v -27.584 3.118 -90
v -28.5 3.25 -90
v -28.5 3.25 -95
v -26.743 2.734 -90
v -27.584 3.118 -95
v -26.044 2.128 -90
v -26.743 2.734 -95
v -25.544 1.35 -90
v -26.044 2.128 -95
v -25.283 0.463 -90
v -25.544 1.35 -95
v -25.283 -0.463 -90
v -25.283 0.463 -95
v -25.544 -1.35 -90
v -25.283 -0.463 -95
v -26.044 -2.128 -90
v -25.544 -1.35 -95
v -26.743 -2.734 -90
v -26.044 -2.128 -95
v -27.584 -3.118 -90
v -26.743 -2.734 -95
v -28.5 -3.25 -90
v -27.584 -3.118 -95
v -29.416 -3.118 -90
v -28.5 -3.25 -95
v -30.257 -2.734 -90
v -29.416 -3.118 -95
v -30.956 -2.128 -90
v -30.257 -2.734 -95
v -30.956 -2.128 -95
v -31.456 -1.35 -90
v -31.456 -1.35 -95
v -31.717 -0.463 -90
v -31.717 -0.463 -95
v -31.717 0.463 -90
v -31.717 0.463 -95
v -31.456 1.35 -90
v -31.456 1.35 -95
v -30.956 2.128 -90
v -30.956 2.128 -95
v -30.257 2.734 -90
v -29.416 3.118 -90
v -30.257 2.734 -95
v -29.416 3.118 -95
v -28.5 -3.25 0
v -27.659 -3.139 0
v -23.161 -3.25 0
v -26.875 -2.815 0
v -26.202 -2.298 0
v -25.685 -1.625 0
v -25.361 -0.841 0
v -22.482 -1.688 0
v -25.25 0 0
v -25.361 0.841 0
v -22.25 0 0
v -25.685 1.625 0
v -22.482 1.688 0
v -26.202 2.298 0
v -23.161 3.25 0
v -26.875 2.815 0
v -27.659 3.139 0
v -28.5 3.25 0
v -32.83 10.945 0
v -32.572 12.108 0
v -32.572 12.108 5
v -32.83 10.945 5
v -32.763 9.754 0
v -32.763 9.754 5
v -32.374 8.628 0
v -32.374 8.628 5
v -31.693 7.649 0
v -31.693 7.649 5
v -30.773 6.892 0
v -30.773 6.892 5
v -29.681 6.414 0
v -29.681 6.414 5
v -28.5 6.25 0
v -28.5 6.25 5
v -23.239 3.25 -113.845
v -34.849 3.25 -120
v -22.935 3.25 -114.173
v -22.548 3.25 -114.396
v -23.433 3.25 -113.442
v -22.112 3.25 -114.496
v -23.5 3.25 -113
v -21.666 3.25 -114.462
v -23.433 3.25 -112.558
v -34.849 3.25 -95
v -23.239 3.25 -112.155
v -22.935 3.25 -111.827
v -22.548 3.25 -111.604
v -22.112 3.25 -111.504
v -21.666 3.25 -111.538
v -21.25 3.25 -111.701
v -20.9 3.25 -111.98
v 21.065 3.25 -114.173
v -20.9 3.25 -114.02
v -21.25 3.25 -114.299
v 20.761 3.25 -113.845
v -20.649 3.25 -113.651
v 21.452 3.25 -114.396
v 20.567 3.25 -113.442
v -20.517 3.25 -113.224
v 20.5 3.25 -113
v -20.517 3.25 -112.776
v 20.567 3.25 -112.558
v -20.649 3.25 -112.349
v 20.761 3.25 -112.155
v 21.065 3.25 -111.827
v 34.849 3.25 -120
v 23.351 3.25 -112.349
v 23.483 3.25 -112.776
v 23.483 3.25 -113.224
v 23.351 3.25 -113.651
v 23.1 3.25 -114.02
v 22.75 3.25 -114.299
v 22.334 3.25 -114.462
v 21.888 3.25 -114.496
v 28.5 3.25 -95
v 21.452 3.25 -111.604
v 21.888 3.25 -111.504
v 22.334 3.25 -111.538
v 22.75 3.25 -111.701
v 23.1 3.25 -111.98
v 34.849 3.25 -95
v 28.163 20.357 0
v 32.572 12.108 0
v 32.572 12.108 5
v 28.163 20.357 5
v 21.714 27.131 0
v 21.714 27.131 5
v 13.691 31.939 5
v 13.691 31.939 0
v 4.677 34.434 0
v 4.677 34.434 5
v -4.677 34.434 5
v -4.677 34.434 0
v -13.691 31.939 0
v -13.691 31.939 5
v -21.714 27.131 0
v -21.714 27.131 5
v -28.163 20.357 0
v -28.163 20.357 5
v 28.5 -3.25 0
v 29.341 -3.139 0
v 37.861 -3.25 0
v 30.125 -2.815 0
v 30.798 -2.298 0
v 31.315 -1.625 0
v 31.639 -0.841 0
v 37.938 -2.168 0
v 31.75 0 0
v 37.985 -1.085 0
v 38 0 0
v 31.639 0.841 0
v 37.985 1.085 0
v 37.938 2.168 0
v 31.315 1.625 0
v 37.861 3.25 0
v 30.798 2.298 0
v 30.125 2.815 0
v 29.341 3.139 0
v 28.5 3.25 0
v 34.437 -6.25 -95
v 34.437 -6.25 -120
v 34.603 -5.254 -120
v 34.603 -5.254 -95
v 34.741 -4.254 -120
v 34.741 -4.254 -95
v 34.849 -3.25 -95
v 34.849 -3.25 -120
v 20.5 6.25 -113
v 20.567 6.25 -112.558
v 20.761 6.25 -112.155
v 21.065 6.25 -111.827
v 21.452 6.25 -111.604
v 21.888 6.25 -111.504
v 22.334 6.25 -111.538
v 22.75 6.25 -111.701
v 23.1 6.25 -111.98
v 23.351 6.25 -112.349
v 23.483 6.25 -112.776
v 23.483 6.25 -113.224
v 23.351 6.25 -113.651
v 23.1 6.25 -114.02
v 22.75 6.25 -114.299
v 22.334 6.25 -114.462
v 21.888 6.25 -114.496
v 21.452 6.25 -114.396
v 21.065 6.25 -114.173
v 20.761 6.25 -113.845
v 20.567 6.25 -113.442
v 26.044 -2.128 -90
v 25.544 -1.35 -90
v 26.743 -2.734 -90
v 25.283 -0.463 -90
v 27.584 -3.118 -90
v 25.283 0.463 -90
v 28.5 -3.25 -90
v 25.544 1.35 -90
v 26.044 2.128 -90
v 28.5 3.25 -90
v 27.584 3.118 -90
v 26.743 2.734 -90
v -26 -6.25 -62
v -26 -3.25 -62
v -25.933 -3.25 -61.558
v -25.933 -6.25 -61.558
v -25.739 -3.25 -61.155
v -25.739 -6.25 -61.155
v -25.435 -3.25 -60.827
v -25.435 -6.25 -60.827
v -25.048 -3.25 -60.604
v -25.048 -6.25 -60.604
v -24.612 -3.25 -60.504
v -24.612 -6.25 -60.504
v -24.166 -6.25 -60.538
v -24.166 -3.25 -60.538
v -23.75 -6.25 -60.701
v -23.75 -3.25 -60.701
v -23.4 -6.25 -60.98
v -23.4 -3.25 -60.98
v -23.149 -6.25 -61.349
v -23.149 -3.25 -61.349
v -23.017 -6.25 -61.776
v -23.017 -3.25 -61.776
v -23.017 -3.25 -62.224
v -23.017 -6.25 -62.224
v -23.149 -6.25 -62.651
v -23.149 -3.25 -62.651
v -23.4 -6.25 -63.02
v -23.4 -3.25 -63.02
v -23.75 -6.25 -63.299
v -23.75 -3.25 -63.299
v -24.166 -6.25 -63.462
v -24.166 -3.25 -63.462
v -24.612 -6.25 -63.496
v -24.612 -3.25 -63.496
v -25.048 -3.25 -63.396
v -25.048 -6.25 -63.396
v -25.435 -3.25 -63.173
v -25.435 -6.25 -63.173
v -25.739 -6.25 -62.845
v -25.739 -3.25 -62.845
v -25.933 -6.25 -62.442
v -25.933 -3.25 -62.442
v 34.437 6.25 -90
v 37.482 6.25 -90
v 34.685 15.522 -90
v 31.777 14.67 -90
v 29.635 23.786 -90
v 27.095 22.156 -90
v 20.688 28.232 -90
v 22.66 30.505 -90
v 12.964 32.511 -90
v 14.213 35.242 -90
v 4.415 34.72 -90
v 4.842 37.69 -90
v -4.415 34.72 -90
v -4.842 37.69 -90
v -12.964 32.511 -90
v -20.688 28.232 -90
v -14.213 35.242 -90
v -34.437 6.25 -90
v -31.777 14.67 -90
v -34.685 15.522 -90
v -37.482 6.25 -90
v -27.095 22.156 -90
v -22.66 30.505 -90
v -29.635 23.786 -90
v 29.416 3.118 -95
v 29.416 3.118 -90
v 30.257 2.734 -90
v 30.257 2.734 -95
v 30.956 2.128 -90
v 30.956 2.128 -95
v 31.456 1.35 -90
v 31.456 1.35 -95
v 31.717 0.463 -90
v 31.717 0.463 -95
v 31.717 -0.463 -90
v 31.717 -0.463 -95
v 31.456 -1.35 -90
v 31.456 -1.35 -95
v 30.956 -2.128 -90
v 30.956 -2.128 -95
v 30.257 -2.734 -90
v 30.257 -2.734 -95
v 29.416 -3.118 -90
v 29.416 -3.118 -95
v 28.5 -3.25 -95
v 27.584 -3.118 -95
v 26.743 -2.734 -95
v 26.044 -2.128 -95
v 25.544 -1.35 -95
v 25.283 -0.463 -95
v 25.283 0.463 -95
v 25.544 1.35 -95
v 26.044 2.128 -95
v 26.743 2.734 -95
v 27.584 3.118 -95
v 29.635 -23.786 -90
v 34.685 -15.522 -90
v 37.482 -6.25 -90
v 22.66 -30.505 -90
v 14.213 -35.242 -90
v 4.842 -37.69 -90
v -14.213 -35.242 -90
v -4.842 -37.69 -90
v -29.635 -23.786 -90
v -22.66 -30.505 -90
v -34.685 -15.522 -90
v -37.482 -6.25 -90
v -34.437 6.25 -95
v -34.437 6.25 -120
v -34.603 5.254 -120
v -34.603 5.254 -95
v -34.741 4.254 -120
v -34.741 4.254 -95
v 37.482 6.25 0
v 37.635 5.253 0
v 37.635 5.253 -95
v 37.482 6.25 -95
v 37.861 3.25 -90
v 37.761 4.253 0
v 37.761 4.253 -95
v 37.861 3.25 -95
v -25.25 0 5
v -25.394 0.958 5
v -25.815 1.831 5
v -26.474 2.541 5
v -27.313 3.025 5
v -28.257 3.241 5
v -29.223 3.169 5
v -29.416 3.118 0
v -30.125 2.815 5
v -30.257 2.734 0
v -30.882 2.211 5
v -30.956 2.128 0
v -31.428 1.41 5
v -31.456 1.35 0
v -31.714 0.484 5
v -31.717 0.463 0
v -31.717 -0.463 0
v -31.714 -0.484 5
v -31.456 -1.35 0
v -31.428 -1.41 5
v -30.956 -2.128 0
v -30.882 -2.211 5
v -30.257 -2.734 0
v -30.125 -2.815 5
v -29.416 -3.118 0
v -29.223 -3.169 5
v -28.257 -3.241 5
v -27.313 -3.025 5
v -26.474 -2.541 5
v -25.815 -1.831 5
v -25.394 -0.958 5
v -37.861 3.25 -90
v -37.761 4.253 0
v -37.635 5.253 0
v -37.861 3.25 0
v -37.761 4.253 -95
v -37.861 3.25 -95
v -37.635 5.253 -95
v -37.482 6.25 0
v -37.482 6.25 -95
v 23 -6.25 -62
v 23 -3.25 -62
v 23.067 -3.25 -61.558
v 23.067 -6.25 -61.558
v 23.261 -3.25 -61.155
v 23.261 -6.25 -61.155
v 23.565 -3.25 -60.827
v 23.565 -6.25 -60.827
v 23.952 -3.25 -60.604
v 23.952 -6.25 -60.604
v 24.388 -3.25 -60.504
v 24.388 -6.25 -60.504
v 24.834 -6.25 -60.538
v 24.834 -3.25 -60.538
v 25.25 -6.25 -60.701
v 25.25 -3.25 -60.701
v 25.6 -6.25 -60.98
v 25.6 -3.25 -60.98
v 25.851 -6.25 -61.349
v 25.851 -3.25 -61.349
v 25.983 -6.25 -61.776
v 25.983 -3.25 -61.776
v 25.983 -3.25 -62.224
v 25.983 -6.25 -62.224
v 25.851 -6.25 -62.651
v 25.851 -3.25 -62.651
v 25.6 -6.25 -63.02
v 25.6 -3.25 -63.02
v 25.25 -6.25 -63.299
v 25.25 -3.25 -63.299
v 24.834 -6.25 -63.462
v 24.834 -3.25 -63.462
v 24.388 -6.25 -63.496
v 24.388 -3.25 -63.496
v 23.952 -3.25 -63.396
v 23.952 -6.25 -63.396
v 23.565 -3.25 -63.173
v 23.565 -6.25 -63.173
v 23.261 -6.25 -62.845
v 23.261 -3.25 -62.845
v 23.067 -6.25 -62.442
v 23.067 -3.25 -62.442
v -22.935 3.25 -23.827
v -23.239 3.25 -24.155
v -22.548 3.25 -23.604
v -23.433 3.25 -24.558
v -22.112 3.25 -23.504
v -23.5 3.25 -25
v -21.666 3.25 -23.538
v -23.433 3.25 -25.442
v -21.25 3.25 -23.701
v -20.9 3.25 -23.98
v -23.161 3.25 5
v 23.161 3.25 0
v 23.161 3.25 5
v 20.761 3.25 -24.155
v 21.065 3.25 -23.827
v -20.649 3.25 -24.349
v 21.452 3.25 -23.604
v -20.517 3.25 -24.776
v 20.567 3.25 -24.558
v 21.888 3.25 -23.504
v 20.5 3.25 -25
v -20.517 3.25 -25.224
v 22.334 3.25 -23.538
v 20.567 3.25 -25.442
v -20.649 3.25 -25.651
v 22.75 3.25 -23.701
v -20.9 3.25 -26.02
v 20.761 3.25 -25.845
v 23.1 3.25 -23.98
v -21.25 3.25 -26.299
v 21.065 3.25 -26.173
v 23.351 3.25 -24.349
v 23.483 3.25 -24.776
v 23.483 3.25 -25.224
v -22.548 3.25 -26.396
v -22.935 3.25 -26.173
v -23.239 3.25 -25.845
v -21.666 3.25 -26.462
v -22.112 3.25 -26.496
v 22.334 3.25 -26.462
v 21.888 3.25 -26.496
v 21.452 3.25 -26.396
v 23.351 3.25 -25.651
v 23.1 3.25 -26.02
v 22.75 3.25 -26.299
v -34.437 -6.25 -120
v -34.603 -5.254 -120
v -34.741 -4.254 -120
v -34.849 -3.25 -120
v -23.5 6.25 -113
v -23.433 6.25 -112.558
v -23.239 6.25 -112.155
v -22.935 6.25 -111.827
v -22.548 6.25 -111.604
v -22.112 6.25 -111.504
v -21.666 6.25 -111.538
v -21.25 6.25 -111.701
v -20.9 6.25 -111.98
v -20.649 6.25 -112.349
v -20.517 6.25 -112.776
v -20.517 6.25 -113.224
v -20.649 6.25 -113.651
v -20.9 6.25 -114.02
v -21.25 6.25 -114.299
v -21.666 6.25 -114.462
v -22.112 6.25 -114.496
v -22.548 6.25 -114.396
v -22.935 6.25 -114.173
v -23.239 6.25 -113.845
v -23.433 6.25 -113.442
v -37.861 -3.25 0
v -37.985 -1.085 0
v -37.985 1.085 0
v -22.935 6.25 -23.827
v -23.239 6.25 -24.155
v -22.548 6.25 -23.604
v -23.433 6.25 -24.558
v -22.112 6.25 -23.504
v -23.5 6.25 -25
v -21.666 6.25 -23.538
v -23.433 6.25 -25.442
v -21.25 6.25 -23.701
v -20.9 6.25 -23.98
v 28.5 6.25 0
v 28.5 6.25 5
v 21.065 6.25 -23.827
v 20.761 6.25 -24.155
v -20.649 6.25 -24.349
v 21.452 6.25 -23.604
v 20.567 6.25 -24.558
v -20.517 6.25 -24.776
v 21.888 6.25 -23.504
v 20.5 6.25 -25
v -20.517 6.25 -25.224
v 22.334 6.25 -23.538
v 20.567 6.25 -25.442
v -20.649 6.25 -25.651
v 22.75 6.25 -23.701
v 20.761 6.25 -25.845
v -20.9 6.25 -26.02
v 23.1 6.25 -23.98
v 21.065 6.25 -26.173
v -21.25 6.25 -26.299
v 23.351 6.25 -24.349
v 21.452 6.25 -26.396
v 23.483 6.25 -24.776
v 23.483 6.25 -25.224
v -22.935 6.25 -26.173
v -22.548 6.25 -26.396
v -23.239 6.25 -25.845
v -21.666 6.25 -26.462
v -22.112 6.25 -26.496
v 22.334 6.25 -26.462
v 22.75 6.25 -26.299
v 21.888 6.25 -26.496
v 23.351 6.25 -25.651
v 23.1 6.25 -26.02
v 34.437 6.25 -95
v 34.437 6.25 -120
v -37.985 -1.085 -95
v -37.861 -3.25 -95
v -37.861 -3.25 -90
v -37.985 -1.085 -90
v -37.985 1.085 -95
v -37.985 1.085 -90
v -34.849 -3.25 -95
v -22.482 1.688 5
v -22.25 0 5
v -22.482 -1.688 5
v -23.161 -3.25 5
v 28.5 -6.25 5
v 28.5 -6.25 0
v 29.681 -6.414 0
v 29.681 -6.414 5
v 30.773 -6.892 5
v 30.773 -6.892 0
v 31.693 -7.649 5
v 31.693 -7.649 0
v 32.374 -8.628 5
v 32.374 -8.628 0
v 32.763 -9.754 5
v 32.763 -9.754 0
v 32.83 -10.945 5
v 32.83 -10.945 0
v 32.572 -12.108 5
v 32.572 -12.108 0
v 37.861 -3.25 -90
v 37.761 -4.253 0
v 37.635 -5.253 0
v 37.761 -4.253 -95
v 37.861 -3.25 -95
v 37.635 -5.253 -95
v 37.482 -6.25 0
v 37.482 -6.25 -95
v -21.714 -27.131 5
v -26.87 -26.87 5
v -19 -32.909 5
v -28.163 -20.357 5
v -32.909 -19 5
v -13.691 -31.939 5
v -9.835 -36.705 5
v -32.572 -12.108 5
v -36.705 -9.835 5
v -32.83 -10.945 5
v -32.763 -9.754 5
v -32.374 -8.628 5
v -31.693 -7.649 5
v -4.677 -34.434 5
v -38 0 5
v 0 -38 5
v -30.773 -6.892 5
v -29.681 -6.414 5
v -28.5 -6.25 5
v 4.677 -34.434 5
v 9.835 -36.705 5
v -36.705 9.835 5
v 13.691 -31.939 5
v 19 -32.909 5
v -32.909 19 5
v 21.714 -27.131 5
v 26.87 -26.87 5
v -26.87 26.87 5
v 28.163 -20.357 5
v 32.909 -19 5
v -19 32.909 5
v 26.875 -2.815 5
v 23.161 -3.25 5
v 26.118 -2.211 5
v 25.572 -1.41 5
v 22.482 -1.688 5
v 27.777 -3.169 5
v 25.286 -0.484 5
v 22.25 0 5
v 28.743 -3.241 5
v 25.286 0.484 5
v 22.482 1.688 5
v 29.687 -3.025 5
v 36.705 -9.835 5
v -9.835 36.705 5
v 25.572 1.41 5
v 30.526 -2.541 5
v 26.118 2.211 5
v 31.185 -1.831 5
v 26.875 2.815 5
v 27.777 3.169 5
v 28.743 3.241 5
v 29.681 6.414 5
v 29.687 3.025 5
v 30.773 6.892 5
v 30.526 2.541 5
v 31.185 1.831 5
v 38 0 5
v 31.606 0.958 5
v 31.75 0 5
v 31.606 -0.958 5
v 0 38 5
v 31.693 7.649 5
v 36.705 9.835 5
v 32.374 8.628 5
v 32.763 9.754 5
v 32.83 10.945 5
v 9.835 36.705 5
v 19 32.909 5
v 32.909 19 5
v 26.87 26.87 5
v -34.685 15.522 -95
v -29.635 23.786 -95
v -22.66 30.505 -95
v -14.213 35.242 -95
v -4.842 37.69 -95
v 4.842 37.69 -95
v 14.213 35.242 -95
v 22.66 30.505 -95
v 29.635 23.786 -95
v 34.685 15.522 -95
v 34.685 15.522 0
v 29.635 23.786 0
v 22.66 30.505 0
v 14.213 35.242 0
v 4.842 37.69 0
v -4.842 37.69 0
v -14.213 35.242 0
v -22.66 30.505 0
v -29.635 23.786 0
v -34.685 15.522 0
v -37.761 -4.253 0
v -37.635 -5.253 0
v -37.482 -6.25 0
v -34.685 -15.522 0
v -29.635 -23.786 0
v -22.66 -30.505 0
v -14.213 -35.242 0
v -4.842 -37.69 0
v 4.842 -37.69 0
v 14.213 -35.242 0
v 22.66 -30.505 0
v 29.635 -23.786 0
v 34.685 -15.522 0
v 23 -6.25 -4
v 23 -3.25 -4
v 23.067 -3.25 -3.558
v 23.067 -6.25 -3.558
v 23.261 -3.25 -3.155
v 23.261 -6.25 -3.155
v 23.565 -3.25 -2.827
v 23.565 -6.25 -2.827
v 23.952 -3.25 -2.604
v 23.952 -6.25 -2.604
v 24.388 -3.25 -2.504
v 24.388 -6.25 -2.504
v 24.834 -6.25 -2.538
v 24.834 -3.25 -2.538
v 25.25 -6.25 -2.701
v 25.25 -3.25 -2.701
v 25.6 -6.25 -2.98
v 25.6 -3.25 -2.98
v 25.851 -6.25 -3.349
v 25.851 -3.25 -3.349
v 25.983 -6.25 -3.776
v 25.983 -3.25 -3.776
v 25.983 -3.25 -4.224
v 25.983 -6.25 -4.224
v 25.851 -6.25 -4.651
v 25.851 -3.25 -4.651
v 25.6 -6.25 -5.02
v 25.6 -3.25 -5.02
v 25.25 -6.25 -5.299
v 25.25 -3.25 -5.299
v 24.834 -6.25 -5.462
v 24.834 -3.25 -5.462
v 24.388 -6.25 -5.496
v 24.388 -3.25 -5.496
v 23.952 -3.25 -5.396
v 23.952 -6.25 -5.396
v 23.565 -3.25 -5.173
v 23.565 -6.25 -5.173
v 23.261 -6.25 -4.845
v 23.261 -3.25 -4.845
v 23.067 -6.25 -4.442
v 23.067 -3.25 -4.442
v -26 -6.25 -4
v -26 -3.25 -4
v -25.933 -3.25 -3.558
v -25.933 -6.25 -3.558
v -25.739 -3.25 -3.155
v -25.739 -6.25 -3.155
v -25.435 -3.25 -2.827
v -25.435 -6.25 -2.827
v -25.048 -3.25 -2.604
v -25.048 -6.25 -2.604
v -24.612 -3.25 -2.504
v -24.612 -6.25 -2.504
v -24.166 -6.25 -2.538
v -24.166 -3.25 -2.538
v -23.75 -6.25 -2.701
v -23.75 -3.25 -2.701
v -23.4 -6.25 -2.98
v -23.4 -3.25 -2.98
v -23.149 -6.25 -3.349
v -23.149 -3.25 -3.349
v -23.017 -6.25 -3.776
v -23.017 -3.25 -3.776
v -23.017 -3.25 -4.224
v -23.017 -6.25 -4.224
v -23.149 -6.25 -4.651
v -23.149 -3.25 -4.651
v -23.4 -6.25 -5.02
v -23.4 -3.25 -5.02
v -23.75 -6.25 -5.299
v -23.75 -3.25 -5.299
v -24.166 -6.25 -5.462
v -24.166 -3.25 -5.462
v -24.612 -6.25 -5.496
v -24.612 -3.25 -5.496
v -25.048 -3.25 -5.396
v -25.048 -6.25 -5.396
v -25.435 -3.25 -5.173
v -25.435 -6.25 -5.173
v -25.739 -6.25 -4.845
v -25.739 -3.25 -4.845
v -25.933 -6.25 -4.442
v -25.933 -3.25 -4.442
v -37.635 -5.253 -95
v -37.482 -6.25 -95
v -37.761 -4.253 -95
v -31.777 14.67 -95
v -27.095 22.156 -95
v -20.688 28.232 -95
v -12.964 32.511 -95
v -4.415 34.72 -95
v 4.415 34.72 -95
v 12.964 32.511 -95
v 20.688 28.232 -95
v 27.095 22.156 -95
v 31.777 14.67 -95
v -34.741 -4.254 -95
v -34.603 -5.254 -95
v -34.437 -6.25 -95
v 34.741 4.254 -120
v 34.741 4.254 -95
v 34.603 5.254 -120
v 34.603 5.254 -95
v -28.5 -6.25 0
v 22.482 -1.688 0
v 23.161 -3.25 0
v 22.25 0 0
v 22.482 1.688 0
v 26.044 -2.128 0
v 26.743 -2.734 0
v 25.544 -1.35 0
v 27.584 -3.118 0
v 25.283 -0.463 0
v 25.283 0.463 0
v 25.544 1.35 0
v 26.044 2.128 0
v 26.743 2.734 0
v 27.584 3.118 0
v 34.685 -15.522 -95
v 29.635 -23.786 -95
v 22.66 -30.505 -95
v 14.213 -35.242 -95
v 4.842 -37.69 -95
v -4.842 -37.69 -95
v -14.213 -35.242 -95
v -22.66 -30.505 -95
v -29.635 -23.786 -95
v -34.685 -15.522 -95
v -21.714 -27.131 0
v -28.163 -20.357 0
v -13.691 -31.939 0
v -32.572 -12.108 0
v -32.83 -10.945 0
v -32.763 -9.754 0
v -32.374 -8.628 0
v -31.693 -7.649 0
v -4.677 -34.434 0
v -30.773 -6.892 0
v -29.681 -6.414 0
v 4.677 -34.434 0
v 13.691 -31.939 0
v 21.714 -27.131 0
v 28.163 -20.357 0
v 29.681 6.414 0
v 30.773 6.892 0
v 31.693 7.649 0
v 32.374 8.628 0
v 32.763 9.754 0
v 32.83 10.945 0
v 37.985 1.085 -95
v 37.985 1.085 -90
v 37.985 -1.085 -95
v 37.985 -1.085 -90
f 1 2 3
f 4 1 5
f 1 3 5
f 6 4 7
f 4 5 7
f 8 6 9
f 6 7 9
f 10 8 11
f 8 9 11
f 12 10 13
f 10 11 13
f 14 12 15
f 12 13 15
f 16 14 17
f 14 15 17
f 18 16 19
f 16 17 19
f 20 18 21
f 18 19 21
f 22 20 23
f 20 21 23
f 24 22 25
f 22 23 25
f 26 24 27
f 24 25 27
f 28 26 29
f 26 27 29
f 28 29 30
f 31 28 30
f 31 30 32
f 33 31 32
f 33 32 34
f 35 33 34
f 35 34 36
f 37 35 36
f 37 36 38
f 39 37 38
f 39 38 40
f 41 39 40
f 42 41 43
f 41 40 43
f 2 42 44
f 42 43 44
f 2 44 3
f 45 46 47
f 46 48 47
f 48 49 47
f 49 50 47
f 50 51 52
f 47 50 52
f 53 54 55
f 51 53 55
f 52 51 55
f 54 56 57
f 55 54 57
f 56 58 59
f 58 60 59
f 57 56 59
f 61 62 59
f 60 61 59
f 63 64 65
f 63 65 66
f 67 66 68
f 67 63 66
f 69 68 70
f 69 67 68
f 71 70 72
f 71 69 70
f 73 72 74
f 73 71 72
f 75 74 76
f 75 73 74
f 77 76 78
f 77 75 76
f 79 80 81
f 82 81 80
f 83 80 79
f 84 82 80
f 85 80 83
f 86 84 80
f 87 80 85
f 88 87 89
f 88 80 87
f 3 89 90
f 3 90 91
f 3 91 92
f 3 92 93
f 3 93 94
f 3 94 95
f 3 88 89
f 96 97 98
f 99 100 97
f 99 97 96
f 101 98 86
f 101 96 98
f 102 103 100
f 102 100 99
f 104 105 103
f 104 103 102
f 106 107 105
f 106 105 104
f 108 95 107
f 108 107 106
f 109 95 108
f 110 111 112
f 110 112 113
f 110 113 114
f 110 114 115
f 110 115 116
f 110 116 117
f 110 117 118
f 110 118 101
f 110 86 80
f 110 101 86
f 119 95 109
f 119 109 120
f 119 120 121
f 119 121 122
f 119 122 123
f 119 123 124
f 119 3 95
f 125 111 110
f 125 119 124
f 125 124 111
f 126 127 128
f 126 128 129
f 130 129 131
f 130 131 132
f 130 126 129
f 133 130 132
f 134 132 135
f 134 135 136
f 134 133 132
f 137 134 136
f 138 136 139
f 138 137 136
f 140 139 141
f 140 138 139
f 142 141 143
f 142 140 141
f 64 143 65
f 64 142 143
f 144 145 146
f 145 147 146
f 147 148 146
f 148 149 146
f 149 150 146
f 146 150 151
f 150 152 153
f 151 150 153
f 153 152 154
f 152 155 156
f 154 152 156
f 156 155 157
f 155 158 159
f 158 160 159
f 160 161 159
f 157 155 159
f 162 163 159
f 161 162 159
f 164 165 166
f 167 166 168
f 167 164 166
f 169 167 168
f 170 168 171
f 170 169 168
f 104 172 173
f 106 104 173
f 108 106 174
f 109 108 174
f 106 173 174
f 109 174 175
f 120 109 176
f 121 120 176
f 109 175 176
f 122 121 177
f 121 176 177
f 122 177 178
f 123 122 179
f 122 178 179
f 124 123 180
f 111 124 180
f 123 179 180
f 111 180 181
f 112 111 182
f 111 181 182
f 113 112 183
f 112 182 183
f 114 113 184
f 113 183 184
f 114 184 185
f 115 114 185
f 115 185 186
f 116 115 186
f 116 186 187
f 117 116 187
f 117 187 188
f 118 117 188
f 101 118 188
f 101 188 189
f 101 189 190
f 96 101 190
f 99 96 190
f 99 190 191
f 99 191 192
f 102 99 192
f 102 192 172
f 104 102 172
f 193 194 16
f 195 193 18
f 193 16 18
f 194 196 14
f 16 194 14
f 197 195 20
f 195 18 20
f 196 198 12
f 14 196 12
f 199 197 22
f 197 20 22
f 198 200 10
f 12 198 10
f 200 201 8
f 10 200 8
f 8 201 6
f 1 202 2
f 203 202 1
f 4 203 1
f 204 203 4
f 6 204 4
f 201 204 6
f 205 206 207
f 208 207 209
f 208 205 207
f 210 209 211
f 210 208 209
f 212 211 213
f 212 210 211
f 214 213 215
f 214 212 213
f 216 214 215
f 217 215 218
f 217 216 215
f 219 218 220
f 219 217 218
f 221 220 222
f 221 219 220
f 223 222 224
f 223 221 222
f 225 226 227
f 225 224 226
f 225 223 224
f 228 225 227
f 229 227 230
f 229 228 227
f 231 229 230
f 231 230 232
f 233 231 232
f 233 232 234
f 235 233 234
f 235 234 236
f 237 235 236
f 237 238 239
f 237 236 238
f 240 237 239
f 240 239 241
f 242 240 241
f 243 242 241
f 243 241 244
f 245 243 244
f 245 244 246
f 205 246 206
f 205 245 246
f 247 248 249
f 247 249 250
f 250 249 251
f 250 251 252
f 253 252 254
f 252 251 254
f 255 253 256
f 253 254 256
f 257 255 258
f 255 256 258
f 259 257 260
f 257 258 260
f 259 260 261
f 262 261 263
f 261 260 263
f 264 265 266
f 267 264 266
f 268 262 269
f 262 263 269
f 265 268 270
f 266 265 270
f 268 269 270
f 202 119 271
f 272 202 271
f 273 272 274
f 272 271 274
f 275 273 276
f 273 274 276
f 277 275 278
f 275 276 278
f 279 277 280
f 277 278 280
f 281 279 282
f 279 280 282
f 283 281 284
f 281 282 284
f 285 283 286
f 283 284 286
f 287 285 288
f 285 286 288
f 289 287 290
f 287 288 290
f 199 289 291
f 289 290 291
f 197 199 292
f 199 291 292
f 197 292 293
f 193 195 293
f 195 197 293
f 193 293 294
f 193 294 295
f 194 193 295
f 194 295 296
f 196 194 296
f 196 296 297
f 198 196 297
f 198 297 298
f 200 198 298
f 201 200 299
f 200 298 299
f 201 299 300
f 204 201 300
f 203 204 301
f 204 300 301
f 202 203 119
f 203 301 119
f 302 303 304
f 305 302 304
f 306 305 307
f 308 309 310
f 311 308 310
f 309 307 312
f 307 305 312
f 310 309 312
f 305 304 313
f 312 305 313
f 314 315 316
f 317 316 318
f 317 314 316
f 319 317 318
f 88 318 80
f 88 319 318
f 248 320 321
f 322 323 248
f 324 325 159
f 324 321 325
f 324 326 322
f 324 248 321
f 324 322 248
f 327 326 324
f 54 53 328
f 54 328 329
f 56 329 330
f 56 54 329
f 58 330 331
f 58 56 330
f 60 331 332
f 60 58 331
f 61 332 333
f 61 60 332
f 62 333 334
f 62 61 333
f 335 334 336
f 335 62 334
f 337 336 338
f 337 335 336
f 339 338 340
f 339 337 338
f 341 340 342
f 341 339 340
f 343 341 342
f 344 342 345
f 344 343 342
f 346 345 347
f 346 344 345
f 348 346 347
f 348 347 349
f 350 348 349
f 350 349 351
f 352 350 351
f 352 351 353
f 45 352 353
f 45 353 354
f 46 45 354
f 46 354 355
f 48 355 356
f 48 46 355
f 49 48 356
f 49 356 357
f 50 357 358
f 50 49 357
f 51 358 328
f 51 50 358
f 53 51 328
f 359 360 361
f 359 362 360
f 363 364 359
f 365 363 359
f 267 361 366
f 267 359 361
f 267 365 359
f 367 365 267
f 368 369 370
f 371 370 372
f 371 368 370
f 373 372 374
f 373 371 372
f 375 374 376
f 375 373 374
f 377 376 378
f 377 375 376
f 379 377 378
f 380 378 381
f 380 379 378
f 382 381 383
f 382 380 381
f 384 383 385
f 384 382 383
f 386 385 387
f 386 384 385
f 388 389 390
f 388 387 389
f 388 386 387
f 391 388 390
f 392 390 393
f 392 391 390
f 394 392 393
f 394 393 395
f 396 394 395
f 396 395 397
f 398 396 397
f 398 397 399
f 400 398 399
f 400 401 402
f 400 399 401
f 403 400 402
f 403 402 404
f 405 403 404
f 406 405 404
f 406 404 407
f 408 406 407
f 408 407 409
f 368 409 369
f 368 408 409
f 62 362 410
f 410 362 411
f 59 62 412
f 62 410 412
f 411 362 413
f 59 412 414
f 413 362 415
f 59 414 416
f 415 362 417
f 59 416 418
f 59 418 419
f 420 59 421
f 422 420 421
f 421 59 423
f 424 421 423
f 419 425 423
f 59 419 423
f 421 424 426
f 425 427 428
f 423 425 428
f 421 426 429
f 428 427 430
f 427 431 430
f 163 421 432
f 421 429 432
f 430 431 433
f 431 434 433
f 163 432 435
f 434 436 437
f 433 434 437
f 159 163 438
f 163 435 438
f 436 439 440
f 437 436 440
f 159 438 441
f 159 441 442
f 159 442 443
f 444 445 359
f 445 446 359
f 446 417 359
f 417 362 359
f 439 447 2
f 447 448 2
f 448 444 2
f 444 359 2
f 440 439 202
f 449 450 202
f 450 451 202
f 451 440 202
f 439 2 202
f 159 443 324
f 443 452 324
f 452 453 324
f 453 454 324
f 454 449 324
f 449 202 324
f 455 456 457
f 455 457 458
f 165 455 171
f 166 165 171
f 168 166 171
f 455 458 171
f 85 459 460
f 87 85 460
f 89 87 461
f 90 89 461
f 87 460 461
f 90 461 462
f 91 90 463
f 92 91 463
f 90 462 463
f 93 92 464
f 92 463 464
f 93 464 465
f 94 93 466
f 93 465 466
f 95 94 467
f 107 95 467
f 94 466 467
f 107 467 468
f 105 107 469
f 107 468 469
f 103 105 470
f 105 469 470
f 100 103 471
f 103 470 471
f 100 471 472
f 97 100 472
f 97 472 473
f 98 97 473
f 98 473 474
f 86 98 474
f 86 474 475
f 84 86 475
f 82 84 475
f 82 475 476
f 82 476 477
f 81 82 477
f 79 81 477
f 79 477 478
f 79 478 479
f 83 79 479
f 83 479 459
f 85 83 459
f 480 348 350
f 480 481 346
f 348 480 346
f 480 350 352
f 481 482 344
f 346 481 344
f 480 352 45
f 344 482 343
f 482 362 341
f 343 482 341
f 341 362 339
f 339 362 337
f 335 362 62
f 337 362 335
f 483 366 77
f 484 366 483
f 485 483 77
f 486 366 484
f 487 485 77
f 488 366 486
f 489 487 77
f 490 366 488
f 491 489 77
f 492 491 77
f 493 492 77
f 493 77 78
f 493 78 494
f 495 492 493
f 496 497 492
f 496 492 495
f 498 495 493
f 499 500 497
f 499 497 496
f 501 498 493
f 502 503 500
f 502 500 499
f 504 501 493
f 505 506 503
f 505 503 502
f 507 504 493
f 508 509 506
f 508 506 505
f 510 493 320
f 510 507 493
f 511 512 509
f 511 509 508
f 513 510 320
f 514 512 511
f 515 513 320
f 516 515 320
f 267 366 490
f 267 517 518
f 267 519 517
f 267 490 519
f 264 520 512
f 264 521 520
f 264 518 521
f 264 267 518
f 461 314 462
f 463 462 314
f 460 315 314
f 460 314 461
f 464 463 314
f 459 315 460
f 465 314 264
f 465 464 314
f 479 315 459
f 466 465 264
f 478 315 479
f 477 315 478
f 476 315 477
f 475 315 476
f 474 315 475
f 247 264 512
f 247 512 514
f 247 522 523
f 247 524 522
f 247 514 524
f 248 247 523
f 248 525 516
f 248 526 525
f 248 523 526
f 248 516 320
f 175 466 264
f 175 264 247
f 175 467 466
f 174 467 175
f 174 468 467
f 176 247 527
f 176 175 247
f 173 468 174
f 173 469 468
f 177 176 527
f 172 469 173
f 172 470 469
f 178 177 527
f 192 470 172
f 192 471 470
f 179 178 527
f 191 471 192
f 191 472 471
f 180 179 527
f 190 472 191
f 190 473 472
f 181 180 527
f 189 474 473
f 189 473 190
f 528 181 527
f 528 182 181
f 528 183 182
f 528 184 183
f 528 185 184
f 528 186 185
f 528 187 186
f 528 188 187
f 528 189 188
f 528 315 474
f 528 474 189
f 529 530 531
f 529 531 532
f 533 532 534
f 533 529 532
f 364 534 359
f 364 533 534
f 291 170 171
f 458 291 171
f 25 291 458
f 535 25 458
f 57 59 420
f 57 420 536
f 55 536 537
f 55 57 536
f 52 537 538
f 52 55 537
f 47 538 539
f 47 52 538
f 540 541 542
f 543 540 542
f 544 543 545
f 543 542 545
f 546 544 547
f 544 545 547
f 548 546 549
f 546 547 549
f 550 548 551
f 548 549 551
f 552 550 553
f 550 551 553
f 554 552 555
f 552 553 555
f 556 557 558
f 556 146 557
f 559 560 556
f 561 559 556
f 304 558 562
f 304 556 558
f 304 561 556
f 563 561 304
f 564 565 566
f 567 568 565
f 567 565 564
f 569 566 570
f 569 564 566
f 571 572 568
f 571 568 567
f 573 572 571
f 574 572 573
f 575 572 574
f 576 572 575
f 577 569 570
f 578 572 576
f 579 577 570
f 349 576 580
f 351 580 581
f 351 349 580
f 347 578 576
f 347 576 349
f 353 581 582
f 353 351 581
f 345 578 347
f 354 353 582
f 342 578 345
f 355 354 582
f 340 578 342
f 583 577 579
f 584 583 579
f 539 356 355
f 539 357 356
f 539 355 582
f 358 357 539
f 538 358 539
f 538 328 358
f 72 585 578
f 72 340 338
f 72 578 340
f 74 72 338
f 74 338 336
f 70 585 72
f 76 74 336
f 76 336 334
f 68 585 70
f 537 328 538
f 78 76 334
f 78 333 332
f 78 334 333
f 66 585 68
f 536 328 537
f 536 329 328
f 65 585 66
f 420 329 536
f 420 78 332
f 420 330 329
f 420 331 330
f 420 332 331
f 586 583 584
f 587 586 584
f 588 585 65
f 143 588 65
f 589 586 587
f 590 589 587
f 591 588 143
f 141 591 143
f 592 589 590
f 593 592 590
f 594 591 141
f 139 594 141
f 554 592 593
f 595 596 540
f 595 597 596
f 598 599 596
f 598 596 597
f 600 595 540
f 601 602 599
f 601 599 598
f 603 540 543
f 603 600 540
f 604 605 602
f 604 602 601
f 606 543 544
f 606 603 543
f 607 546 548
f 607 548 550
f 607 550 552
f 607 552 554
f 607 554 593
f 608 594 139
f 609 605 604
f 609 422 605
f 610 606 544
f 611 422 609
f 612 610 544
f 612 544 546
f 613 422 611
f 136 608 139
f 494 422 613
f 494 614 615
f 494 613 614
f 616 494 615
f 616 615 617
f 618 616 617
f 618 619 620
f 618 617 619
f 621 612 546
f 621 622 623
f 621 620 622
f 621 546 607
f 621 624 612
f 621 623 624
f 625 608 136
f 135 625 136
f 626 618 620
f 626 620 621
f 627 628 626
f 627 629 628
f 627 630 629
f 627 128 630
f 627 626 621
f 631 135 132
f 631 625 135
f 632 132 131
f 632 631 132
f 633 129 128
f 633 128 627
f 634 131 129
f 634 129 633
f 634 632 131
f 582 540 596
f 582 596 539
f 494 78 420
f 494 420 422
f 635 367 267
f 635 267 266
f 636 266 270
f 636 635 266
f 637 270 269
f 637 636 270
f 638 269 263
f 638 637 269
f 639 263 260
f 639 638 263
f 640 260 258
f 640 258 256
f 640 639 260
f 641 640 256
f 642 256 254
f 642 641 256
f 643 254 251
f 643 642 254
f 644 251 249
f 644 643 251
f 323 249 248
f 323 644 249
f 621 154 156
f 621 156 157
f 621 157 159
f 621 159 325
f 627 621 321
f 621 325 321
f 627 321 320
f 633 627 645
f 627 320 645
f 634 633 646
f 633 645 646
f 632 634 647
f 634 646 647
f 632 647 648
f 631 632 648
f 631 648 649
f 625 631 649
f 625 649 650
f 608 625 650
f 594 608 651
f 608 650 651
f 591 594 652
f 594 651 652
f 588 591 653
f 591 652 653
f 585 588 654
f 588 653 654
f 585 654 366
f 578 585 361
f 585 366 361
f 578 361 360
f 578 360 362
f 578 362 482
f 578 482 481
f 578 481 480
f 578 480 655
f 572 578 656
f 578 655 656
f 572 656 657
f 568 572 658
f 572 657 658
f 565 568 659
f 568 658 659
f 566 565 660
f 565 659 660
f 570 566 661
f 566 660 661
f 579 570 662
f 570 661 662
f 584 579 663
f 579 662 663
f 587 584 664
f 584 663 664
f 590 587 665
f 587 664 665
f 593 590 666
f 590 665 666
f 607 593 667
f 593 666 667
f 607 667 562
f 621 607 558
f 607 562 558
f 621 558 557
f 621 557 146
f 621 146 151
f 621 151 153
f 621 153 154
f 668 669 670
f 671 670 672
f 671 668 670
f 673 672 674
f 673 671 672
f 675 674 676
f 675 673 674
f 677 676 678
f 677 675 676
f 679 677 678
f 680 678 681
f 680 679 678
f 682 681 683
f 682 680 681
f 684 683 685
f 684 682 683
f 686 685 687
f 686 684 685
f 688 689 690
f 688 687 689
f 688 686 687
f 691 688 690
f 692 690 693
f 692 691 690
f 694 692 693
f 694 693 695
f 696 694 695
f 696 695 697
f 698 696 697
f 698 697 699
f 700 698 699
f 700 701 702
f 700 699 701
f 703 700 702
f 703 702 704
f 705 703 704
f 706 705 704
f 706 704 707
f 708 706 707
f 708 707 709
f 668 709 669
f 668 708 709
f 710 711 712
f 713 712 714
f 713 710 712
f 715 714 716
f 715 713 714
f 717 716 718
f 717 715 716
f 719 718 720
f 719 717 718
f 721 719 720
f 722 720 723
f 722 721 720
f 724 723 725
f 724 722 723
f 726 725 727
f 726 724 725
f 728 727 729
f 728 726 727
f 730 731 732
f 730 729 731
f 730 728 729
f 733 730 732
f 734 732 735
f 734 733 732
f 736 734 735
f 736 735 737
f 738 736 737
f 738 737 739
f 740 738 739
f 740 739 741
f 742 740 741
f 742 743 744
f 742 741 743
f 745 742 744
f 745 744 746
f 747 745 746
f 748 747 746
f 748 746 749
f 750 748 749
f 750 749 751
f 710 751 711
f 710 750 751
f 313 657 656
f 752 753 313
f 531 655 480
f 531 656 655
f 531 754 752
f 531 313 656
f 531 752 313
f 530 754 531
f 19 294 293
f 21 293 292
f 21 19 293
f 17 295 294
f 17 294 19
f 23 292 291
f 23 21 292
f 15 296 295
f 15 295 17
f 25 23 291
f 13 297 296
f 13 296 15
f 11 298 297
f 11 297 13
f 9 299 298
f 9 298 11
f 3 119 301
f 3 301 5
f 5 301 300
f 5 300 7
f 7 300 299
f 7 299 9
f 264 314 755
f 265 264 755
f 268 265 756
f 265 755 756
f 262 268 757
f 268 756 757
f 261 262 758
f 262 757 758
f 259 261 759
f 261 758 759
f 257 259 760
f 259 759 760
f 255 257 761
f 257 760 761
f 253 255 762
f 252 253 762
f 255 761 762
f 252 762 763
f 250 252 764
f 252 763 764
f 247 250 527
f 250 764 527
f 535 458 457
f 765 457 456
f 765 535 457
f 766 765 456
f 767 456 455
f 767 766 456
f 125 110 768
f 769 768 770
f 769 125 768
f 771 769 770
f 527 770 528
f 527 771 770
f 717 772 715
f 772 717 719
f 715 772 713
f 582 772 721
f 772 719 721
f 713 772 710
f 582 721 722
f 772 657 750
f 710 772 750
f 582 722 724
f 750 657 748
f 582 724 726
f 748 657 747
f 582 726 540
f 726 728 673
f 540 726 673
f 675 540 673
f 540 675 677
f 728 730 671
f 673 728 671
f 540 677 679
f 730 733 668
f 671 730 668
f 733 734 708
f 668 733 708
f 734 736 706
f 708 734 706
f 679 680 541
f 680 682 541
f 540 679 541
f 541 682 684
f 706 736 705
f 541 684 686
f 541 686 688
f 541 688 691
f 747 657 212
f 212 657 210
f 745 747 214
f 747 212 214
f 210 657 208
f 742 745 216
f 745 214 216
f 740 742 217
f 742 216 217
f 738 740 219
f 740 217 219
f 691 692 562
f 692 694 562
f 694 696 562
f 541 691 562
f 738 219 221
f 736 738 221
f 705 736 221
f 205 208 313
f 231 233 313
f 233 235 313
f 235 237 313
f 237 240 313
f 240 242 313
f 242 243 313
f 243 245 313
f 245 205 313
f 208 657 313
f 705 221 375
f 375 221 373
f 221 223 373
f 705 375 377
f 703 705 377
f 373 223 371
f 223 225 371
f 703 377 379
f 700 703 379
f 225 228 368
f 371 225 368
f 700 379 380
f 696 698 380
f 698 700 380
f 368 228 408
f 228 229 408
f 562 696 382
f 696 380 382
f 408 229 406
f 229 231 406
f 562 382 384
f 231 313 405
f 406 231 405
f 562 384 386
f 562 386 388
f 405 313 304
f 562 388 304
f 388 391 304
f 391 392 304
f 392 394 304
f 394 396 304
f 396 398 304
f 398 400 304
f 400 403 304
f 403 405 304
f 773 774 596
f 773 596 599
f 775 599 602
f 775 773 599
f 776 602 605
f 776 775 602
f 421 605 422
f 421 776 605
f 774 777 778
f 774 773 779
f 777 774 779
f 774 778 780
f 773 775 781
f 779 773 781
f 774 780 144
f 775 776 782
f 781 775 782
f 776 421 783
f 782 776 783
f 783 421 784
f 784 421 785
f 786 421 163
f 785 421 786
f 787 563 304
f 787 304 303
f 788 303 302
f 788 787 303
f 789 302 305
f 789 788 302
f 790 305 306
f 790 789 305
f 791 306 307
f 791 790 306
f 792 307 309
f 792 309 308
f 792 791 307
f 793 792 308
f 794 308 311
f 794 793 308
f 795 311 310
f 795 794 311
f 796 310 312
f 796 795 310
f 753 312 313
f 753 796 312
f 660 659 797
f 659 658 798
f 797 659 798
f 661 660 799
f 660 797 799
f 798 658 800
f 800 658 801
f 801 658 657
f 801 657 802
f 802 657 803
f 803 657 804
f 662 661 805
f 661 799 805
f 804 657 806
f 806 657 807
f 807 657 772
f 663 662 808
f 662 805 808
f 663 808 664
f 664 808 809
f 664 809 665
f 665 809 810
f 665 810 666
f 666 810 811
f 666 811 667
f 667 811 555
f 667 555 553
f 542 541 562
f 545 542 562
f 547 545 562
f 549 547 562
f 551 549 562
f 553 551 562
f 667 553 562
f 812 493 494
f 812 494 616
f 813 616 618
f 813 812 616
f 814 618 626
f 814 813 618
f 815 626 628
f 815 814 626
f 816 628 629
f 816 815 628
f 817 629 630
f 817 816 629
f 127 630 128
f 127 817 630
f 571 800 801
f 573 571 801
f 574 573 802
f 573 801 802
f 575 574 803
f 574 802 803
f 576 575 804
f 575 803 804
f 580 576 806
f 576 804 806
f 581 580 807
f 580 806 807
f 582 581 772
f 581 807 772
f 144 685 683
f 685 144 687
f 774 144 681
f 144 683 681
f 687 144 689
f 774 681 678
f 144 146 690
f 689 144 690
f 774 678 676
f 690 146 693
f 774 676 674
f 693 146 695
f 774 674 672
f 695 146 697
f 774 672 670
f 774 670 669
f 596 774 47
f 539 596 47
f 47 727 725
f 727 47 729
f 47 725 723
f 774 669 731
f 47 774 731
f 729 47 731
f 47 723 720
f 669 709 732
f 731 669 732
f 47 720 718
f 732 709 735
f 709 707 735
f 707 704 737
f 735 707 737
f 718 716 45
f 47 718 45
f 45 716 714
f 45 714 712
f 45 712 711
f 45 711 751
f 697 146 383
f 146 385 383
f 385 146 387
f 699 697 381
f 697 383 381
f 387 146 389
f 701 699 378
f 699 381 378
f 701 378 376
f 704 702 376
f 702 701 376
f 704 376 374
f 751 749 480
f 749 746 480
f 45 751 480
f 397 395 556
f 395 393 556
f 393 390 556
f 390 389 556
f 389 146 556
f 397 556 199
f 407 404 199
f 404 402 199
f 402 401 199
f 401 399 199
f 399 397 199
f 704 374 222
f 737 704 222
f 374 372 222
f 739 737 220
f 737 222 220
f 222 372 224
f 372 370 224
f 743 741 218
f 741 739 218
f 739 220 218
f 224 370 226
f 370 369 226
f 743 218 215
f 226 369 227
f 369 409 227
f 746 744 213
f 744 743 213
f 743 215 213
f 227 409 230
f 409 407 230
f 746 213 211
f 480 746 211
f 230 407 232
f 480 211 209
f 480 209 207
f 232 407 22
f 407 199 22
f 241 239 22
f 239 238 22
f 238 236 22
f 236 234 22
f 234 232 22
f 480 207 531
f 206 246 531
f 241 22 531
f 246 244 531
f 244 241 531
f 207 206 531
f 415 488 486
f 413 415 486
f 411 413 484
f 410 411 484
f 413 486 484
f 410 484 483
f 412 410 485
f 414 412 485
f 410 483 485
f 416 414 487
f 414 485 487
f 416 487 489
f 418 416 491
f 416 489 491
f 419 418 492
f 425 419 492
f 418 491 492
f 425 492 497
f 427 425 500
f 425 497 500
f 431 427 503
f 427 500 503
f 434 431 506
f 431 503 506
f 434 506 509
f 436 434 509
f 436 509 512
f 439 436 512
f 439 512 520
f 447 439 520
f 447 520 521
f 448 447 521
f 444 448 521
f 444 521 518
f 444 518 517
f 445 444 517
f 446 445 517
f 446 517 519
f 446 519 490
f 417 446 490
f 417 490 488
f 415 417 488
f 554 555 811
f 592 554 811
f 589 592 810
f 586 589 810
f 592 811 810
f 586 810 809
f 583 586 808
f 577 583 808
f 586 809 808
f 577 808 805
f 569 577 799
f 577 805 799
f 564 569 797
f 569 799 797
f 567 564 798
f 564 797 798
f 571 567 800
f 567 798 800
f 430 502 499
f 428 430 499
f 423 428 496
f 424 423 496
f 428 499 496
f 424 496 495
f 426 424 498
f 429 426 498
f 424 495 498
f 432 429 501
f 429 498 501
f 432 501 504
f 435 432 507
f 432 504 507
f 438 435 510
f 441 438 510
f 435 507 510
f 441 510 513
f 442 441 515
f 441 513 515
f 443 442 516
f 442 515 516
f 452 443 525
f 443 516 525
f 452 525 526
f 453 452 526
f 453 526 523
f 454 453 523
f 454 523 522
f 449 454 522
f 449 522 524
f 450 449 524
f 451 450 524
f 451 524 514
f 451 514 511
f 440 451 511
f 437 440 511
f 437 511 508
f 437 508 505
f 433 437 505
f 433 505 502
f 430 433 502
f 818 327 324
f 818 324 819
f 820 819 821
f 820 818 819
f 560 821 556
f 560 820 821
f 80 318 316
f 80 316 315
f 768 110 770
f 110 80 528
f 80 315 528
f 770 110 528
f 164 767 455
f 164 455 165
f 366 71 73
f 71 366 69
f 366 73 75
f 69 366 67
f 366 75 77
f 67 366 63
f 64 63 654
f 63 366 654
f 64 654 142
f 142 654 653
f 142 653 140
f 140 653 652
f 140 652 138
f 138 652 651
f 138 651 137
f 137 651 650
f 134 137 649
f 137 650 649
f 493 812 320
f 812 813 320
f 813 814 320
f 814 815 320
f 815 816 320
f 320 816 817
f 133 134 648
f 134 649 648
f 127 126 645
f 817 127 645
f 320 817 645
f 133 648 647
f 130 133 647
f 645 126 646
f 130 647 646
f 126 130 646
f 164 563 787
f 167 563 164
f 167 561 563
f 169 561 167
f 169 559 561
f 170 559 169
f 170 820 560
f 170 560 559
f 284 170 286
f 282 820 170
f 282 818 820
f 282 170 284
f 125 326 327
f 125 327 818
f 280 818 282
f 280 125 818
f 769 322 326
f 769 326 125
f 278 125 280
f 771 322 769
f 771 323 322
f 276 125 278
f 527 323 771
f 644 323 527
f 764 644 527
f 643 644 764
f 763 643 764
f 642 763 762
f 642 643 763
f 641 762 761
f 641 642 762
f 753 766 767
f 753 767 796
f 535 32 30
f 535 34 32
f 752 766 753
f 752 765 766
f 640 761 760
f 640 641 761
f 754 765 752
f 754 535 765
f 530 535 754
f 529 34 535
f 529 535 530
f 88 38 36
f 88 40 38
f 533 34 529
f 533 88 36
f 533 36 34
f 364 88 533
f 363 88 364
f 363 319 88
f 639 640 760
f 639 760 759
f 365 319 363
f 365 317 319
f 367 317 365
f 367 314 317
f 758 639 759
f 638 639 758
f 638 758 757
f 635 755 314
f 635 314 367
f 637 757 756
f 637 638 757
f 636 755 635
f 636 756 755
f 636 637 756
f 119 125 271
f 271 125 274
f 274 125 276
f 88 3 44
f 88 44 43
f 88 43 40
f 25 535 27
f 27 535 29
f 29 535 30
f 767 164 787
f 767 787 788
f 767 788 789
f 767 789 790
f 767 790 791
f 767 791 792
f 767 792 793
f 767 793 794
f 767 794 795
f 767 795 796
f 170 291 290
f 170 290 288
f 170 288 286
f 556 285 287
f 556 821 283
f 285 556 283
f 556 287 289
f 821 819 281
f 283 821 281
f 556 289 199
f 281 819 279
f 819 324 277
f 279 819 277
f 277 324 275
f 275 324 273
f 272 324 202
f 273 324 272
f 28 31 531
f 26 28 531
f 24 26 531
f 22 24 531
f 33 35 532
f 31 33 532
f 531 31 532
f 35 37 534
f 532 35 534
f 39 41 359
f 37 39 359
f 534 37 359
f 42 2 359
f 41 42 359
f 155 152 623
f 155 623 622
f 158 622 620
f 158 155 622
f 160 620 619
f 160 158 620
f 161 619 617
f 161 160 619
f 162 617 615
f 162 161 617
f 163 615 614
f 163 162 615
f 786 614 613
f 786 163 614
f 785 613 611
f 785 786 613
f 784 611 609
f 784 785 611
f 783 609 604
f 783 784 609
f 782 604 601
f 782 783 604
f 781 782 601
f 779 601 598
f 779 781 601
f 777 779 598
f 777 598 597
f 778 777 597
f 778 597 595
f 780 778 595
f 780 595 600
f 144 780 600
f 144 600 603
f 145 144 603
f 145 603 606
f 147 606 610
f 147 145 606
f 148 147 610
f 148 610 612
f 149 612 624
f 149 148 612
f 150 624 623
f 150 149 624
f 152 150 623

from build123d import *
from build123d.topology import SkipClean

# Parameters (mm, degrees)
SKETCH1_R           = 38
SKETCH1_R_2         = 3.25
BOSS_EXTRUDE1_DEPTH = 5
BOSS_EXTRUDE2_START = 90
BOSS_EXTRUDE2_DEPTH = 90
BOSS_EXTRUDE3_START = 5
BOSS_EXTRUDE3_DEPTH = 5
CUT_EXTRUDE1_REACH  = 113.477
SKETCH4_R           = 1.5
BOSS_EXTRUDE5_START = -95
BOSS_EXTRUDE5_DEPTH = 120
CUT_EXTRUDE2_REACH  = 135.424
SKETCH7_R           = 1.5
CUT_EXTRUDE3_REACH  = 115.525
BOSS_EXTRUDE6_DEPTH = 25


with BuildPart() as part:
    # Sketch1 → Boss-Extrude1 (new body)
    with BuildSketch(Plane.XY):
        Circle(SKETCH1_R)
        with Locations((-28.5, 0)):
            Circle(SKETCH1_R_2, mode=Mode.SUBTRACT)
        with Locations((28.5, 0)):
            Circle(SKETCH1_R_2, mode=Mode.SUBTRACT)
        with BuildLine():
            Line((-28.5, -6.25), (28.5, -6.25))
            ThreePointArc((28.5, -6.25), (32.067319136, -8.114790357), (32.572245062, -12.108317457))
            ThreePointArc((32.572245062, -12.108317457), (0, -34.75), (-32.572245062, -12.108317457))
            ThreePointArc((-32.572245062, -12.108317457), (-32.067319136, -8.114790357), (-28.5, -6.25))
        make_face(mode=Mode.SUBTRACT)
        with BuildLine():
            Line((-28.5, 6.25), (28.5, 6.25))
            ThreePointArc((28.5, 6.25), (32.067319136, 8.114790357), (32.572245062, 12.108317457))
            ThreePointArc((32.572245062, 12.108317457), (0, 34.75), (-32.572245062, 12.108317457))
            ThreePointArc((-32.572245062, 12.108317457), (-32.067319136, 8.114790357), (-28.5, 6.25))
        make_face(mode=Mode.SUBTRACT)
        with BuildLine():
            Line((23.161460874, 3.25), (-23.161460874, 3.25))
            ThreePointArc((-23.161460874, 3.25), (-22.25, 0), (-23.161460874, -3.25))
            Line((-23.161460874, -3.25), (23.161460874, -3.25))
            ThreePointArc((23.161460874, -3.25), (22.25, 0), (23.161460874, 3.25))
        make_face(mode=Mode.SUBTRACT)
    extrude(amount=BOSS_EXTRUDE1_DEPTH)

    # Sketch2 → Boss-Extrude2 (add)
    with BuildSketch(Plane(origin=(0, 0, 0), x_dir=(-1, 0, 0), z_dir=(0, 0, -1)).offset(BOSS_EXTRUDE2_START)):
        with BuildLine():
            Line((-37.860764652, -3.25), (37.860764652, -3.25))
            ThreePointArc((37.860764652, -3.25), (37.701481777, -4.753763962), (37.482495915, -6.25))
            Line((37.482495915, -6.25), (-37.482495915, -6.25))
            ThreePointArc((-37.482495915, -6.25), (-37.701481777, -4.753763962), (-37.860764652, -3.25))
        make_face()
        with BuildLine():
            Line((-37.482495915, 6.25), (37.482495915, 6.25))
            ThreePointArc((37.482495915, 6.25), (37.701481777, 4.753763962), (37.860764652, 3.25))
            Line((37.860764652, 3.25), (-37.860764652, 3.25))
            ThreePointArc((-37.860764652, 3.25), (-37.701481777, 4.753763962), (-37.482495915, 6.25))
        make_face()
    extrude(amount=-BOSS_EXTRUDE2_DEPTH)

    # Sketch3 → Boss-Extrude3 (add)
    with SkipClean():  # the faces are left unmerged after this step: merging them gives an invalid solid
        with BuildSketch(Plane(origin=(0, 0, -90), x_dir=(-1, 0, 0), z_dir=(0, 0, -1)).offset(BOSS_EXTRUDE3_START)):
            with BuildLine():
                ThreePointArc((37.860764652, 3.25), (37.701481777, 4.753763962), (37.482495915, 6.25))
                ThreePointArc((37.482495915, 6.25), (0, 38), (-37.482495915, 6.25))
                ThreePointArc((-37.482495915, 6.25), (-37.701481777, 4.753763962), (-37.860764652, 3.25))
                ThreePointArc((-37.860764652, 3.25), (-38, 0), (-37.860764652, -3.25))
                ThreePointArc((-37.860764652, -3.25), (-37.701481777, -4.753763962), (-37.482495915, -6.25))
                ThreePointArc((-37.482495915, -6.25), (0, -38), (37.482495915, -6.25))
                ThreePointArc((37.482495915, -6.25), (37.701481777, -4.753763962), (37.860764652, -3.25))
                ThreePointArc((37.860764652, -3.25), (38, 0), (37.860764652, 3.25))
            make_face()
            with BuildLine():
                ThreePointArc((-28.5, 3.25), (-31.75, 0), (-28.5, -3.25))
                ThreePointArc((-28.5, -3.25), (-25.25, 0), (-28.5, 3.25))
            make_face(mode=Mode.SUBTRACT)
            with BuildLine():
                ThreePointArc((28.5, 3.25), (25.25, 0), (28.5, -3.25))
                ThreePointArc((28.5, -3.25), (31.75, 0), (28.5, 3.25))
            make_face(mode=Mode.SUBTRACT)
        extrude(amount=-BOSS_EXTRUDE3_DEPTH)

    # Sketch4 → Cut-Extrude1 (cut, up to next)
    with BuildSketch(Plane(origin=(0, -6.25, 0), x_dir=(1, 0, 0), z_dir=(0, 1, 0)), mode=Mode.PRIVATE) as cut_extrude1_sk1:
        with Locations(Location((-24.5, 62, 0), (0, 0, 180))):
            Circle(SKETCH4_R)
    cut_extrude1_tool1 = extrude(cut_extrude1_sk1.sketch, amount=CUT_EXTRUDE1_REACH, mode=Mode.PRIVATE) & part.part
    # Sketch4 → Cut-Extrude1 (cut, up to next)
    with BuildSketch(Plane(origin=(0, -6.25, 0), x_dir=(1, 0, 0), z_dir=(0, 1, 0)), mode=Mode.PRIVATE) as cut_extrude1_sk2:
        with Locations(Location((24.5, 62, 0), (0, 0, 180))):
            Circle(SKETCH4_R)
    cut_extrude1_tool2 = extrude(cut_extrude1_sk2.sketch, amount=CUT_EXTRUDE1_REACH, mode=Mode.PRIVATE) & part.part
    # Sketch4 → Cut-Extrude1 (cut, up to next)
    with BuildSketch(Plane(origin=(0, -6.25, 0), x_dir=(1, 0, 0), z_dir=(0, 1, 0)), mode=Mode.PRIVATE) as cut_extrude1_sk3:
        with Locations(Location((24.5, 4, 0), (0, 0, 180))):
            Circle(SKETCH4_R)
    cut_extrude1_tool3 = extrude(cut_extrude1_sk3.sketch, amount=CUT_EXTRUDE1_REACH, mode=Mode.PRIVATE) & part.part
    # Sketch4 → Cut-Extrude1 (cut, up to next)
    with BuildSketch(Plane(origin=(0, -6.25, 0), x_dir=(1, 0, 0), z_dir=(0, 1, 0)), mode=Mode.PRIVATE) as cut_extrude1_sk4:
        with Locations(Location((-24.5, 4, 0), (0, 0, 180))):
            Circle(SKETCH4_R)
    cut_extrude1_tool4 = extrude(cut_extrude1_sk4.sketch, amount=CUT_EXTRUDE1_REACH, mode=Mode.PRIVATE) & part.part
    add(cut_extrude1_tool1.solids().sort_by_distance((-24.5, -6.25, -62))[0], mode=Mode.SUBTRACT)
    add(cut_extrude1_tool2.solids().sort_by_distance((24.5, -6.25, -62))[0], mode=Mode.SUBTRACT)
    add(cut_extrude1_tool3.solids().sort_by_distance((24.5, -6.25, -4))[0], mode=Mode.SUBTRACT)
    add(cut_extrude1_tool4.solids().sort_by_distance((-24.5, -6.25, -4))[0], mode=Mode.SUBTRACT)

    # Sketch6 → Boss-Extrude5 (add)
    with SkipClean():  # the faces are left unmerged after this step: merging them gives an invalid solid
        with BuildSketch(Plane(origin=(0, 0, -95), x_dir=(-1, 0, 0), z_dir=(0, 0, -1)).offset(BOSS_EXTRUDE5_START)):
            with BuildLine():
                Line((-34.437443285, 6.25), (34.437443285, 6.25))
                ThreePointArc((34.437443285, 6.25), (34.675570658, 4.754450501), (34.848780466, 3.25))
                Line((34.848780466, 3.25), (-34.848780466, 3.25))
                ThreePointArc((-34.848780466, 3.25), (-34.675570658, 4.754450501), (-34.437443285, 6.25))
            make_face()
        extrude(amount=BOSS_EXTRUDE5_DEPTH)

    # Sketch7 → Cut-Extrude2 (cut, up to next)
    with BuildSketch(Plane(origin=(0, 6.25, 0), x_dir=(1, 0, 0), z_dir=(0, 1, 0)), mode=Mode.PRIVATE) as cut_extrude2_sk1:
        with Locations(Location((-22, 113, 0), (0, 0, 180))):
            Circle(SKETCH7_R)
    cut_extrude2_tool1 = extrude(cut_extrude2_sk1.sketch, amount=-CUT_EXTRUDE2_REACH, mode=Mode.PRIVATE) & part.part
    # Sketch7 → Cut-Extrude2 (cut, up to next)
    with BuildSketch(Plane(origin=(0, 6.25, 0), x_dir=(1, 0, 0), z_dir=(0, 1, 0)), mode=Mode.PRIVATE) as cut_extrude2_sk2:
        with Locations(Location((22, 113, 0), (0, 0, 180))):
            Circle(SKETCH7_R)
    cut_extrude2_tool2 = extrude(cut_extrude2_sk2.sketch, amount=-CUT_EXTRUDE2_REACH, mode=Mode.PRIVATE) & part.part
    # Sketch7 → Cut-Extrude2 (cut, up to next)
    with BuildSketch(Plane(origin=(0, 6.25, 0), x_dir=(1, 0, 0), z_dir=(0, 1, 0)), mode=Mode.PRIVATE) as cut_extrude2_sk3:
        with Locations(Location((22, 25, 0), (0, 0, 180))):
            Circle(SKETCH7_R)
    cut_extrude2_tool3 = extrude(cut_extrude2_sk3.sketch, amount=-CUT_EXTRUDE2_REACH, mode=Mode.PRIVATE) & part.part
    # Sketch7 → Cut-Extrude2 (cut, up to next)
    with BuildSketch(Plane(origin=(0, 6.25, 0), x_dir=(1, 0, 0), z_dir=(0, 1, 0)), mode=Mode.PRIVATE) as cut_extrude2_sk4:
        with Locations(Location((-22, 25, 0), (0, 0, 180))):
            Circle(SKETCH7_R)
    cut_extrude2_tool4 = extrude(cut_extrude2_sk4.sketch, amount=-CUT_EXTRUDE2_REACH, mode=Mode.PRIVATE) & part.part
    add(cut_extrude2_tool1.solids().sort_by_distance((-22, 6.25, -113))[0], mode=Mode.SUBTRACT)
    add(cut_extrude2_tool2.solids().sort_by_distance((22, 6.25, -113))[0], mode=Mode.SUBTRACT)
    add(cut_extrude2_tool3.solids().sort_by_distance((22, 6.25, -25))[0], mode=Mode.SUBTRACT)
    add(cut_extrude2_tool4.solids().sort_by_distance((-22, 6.25, -25))[0], mode=Mode.SUBTRACT)

    # Sketch8 → Cut-Extrude3 (cut, up to next)
    with BuildSketch(Plane(origin=(0, 0, -95), x_dir=(-1, 0, 0), z_dir=(0, 0, -1)), mode=Mode.PRIVATE) as cut_extrude3_sk1:
        with BuildLine():
            Line((-34.437443285, 6.25), (34.437443285, 6.25))
            ThreePointArc((34.437443285, 6.25), (0, 35), (-34.437443285, 6.25))
        make_face()
    cut_extrude3_tool1 = extrude(cut_extrude3_sk1.sketch, amount=-CUT_EXTRUDE3_REACH, mode=Mode.PRIVATE) & part.part
    add(cut_extrude3_tool1.solids().sort_by_distance((0, 18.284736, -95))[0], mode=Mode.SUBTRACT)

    # Sketch9 → Boss-Extrude6 (add)
    with SkipClean():  # the faces are left unmerged after this step: merging them gives an invalid solid
        with BuildSketch(Plane(origin=(0, 0, -95), x_dir=(-1, 0, 0), z_dir=(0, 0, -1))):
            with BuildLine():
                Line((-34.848780466, -3.25), (34.848780466, -3.25))
                ThreePointArc((34.848780466, -3.25), (34.675570658, -4.754450501), (34.437443285, -6.25))
                Line((34.437443285, -6.25), (-34.437443285, -6.25))
                ThreePointArc((-34.437443285, -6.25), (-34.675570658, -4.754450501), (-34.848780466, -3.25))
            make_face()
        extrude(amount=BOSS_EXTRUDE6_DEPTH)


solid = part.part
